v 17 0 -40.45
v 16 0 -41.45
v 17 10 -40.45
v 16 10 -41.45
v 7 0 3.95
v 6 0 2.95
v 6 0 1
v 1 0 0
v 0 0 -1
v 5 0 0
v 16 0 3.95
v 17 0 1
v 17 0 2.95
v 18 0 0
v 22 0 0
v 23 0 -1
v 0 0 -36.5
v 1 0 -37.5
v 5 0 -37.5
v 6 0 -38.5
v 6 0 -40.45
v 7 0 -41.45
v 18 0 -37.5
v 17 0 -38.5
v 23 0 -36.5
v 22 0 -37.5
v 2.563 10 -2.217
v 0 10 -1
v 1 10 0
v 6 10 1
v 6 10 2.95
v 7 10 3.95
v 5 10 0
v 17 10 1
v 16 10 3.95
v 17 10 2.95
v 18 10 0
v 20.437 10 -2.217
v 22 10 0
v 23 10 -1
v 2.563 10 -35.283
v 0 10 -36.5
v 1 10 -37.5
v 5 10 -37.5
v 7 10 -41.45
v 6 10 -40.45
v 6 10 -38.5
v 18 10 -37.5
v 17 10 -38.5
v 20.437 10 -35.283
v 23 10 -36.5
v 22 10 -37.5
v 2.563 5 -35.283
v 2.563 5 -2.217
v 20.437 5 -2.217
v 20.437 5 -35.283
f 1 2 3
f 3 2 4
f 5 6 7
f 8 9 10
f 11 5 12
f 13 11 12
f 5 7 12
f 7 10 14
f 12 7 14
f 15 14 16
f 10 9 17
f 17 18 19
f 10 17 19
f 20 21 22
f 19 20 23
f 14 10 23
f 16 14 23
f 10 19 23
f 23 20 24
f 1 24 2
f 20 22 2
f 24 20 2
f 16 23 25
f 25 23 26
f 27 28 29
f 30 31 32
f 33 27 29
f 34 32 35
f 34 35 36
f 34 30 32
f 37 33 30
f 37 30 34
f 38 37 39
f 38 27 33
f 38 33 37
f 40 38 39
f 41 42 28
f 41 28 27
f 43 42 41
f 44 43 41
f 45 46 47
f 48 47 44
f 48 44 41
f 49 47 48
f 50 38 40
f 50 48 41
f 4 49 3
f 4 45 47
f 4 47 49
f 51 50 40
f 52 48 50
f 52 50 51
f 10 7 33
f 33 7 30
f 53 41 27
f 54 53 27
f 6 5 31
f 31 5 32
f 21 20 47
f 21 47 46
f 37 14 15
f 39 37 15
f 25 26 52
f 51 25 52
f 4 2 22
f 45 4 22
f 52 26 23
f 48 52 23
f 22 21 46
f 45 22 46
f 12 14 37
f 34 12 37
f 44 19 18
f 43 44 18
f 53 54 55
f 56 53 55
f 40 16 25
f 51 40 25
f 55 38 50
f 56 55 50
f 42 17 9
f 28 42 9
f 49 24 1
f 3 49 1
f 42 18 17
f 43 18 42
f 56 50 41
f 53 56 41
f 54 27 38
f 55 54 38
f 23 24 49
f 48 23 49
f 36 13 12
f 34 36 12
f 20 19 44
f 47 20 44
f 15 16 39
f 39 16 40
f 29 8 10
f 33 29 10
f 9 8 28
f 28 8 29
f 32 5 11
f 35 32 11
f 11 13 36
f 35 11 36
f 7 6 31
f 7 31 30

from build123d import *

# Parameters (mm, degrees)
SKETCH_1_W          = 5.5
SKETCH_1_H          = 3.95
EXTRUDE_1_DEPTH     = 10
CHAMFER_1_SIZE      = 1
SKETCH_2_W          = 8.93689146
SKETCH_2_H          = 16.533425066
CUT_EXTRUDE_1_DEPTH = 5


with BuildPart() as part:
    # ｽｹｯﾁ1 → ﾎﾞｽ - 押し出し1 (new body)
    with BuildSketch(Plane(origin=(0, 0, 0), x_dir=(1, 0, 0), z_dir=(0, 1, 0))):
        Polygon((0, 37.5), (0, 18.75), (23, 18.75), (23, 37.5), (17, 37.5), (11.5, 37.5), (6, 37.5), align=None)
        Polygon((0, 18.75), (0, 0), (6, 0), (11.5, 0), (17, 0), (23, 0), (23, 18.75), align=None)
        with Locations((14.25, -1.975)):
            Rectangle(SKETCH_1_W, SKETCH_1_H)
        with Locations((8.75, -1.975)):
            Rectangle(SKETCH_1_W, SKETCH_1_H)
        with Locations((14.25, 39.475)):
            Rectangle(SKETCH_1_W, SKETCH_1_H)
        with Locations((8.75, 39.475)):
            Rectangle(SKETCH_1_W, SKETCH_1_H)
    extrude(amount=EXTRUDE_1_DEPTH)

    # 面取り1
    chamfer_1_edges = [part.edges().sort_by_distance(p)[0] for p in [
        (6, 5, 3.95),
        (6, 5, 0),
        (0, 5, 0),
        (0, 5, -37.5),
        (6, 5, -37.5),
        (6, 5, -41.45),
        (17, 5, -41.45),
        (17, 5, -37.5),
        (23, 5, -37.5),
        (23, 5, 0),
        (17, 5, 0),
        (17, 5, 3.95),
    ]]
    chamfer(chamfer_1_edges, length=CHAMFER_1_SIZE)

    # ｽｹｯﾁ2 → ｶｯﾄ - 押し出し1 (cut)
    with BuildSketch(Plane(origin=(0, 10, 0), x_dir=(1, 0, 0), z_dir=(0, 1, 0))):
        with Locations((7.03155427, 10.483287467)):
            Rectangle(SKETCH_2_W, SKETCH_2_H)
        with Locations((15.96844573, 10.483287467)):
            Rectangle(SKETCH_2_W, SKETCH_2_H)
        with Locations((15.96844573, 27.016712533)):
            Rectangle(SKETCH_2_W, SKETCH_2_H)
        with Locations((7.03155427, 27.016712533)):
            Rectangle(SKETCH_2_W, SKETCH_2_H)
    extrude(amount=-CUT_EXTRUDE_1_DEPTH, mode=Mode.SUBTRACT)


solid = part.part
